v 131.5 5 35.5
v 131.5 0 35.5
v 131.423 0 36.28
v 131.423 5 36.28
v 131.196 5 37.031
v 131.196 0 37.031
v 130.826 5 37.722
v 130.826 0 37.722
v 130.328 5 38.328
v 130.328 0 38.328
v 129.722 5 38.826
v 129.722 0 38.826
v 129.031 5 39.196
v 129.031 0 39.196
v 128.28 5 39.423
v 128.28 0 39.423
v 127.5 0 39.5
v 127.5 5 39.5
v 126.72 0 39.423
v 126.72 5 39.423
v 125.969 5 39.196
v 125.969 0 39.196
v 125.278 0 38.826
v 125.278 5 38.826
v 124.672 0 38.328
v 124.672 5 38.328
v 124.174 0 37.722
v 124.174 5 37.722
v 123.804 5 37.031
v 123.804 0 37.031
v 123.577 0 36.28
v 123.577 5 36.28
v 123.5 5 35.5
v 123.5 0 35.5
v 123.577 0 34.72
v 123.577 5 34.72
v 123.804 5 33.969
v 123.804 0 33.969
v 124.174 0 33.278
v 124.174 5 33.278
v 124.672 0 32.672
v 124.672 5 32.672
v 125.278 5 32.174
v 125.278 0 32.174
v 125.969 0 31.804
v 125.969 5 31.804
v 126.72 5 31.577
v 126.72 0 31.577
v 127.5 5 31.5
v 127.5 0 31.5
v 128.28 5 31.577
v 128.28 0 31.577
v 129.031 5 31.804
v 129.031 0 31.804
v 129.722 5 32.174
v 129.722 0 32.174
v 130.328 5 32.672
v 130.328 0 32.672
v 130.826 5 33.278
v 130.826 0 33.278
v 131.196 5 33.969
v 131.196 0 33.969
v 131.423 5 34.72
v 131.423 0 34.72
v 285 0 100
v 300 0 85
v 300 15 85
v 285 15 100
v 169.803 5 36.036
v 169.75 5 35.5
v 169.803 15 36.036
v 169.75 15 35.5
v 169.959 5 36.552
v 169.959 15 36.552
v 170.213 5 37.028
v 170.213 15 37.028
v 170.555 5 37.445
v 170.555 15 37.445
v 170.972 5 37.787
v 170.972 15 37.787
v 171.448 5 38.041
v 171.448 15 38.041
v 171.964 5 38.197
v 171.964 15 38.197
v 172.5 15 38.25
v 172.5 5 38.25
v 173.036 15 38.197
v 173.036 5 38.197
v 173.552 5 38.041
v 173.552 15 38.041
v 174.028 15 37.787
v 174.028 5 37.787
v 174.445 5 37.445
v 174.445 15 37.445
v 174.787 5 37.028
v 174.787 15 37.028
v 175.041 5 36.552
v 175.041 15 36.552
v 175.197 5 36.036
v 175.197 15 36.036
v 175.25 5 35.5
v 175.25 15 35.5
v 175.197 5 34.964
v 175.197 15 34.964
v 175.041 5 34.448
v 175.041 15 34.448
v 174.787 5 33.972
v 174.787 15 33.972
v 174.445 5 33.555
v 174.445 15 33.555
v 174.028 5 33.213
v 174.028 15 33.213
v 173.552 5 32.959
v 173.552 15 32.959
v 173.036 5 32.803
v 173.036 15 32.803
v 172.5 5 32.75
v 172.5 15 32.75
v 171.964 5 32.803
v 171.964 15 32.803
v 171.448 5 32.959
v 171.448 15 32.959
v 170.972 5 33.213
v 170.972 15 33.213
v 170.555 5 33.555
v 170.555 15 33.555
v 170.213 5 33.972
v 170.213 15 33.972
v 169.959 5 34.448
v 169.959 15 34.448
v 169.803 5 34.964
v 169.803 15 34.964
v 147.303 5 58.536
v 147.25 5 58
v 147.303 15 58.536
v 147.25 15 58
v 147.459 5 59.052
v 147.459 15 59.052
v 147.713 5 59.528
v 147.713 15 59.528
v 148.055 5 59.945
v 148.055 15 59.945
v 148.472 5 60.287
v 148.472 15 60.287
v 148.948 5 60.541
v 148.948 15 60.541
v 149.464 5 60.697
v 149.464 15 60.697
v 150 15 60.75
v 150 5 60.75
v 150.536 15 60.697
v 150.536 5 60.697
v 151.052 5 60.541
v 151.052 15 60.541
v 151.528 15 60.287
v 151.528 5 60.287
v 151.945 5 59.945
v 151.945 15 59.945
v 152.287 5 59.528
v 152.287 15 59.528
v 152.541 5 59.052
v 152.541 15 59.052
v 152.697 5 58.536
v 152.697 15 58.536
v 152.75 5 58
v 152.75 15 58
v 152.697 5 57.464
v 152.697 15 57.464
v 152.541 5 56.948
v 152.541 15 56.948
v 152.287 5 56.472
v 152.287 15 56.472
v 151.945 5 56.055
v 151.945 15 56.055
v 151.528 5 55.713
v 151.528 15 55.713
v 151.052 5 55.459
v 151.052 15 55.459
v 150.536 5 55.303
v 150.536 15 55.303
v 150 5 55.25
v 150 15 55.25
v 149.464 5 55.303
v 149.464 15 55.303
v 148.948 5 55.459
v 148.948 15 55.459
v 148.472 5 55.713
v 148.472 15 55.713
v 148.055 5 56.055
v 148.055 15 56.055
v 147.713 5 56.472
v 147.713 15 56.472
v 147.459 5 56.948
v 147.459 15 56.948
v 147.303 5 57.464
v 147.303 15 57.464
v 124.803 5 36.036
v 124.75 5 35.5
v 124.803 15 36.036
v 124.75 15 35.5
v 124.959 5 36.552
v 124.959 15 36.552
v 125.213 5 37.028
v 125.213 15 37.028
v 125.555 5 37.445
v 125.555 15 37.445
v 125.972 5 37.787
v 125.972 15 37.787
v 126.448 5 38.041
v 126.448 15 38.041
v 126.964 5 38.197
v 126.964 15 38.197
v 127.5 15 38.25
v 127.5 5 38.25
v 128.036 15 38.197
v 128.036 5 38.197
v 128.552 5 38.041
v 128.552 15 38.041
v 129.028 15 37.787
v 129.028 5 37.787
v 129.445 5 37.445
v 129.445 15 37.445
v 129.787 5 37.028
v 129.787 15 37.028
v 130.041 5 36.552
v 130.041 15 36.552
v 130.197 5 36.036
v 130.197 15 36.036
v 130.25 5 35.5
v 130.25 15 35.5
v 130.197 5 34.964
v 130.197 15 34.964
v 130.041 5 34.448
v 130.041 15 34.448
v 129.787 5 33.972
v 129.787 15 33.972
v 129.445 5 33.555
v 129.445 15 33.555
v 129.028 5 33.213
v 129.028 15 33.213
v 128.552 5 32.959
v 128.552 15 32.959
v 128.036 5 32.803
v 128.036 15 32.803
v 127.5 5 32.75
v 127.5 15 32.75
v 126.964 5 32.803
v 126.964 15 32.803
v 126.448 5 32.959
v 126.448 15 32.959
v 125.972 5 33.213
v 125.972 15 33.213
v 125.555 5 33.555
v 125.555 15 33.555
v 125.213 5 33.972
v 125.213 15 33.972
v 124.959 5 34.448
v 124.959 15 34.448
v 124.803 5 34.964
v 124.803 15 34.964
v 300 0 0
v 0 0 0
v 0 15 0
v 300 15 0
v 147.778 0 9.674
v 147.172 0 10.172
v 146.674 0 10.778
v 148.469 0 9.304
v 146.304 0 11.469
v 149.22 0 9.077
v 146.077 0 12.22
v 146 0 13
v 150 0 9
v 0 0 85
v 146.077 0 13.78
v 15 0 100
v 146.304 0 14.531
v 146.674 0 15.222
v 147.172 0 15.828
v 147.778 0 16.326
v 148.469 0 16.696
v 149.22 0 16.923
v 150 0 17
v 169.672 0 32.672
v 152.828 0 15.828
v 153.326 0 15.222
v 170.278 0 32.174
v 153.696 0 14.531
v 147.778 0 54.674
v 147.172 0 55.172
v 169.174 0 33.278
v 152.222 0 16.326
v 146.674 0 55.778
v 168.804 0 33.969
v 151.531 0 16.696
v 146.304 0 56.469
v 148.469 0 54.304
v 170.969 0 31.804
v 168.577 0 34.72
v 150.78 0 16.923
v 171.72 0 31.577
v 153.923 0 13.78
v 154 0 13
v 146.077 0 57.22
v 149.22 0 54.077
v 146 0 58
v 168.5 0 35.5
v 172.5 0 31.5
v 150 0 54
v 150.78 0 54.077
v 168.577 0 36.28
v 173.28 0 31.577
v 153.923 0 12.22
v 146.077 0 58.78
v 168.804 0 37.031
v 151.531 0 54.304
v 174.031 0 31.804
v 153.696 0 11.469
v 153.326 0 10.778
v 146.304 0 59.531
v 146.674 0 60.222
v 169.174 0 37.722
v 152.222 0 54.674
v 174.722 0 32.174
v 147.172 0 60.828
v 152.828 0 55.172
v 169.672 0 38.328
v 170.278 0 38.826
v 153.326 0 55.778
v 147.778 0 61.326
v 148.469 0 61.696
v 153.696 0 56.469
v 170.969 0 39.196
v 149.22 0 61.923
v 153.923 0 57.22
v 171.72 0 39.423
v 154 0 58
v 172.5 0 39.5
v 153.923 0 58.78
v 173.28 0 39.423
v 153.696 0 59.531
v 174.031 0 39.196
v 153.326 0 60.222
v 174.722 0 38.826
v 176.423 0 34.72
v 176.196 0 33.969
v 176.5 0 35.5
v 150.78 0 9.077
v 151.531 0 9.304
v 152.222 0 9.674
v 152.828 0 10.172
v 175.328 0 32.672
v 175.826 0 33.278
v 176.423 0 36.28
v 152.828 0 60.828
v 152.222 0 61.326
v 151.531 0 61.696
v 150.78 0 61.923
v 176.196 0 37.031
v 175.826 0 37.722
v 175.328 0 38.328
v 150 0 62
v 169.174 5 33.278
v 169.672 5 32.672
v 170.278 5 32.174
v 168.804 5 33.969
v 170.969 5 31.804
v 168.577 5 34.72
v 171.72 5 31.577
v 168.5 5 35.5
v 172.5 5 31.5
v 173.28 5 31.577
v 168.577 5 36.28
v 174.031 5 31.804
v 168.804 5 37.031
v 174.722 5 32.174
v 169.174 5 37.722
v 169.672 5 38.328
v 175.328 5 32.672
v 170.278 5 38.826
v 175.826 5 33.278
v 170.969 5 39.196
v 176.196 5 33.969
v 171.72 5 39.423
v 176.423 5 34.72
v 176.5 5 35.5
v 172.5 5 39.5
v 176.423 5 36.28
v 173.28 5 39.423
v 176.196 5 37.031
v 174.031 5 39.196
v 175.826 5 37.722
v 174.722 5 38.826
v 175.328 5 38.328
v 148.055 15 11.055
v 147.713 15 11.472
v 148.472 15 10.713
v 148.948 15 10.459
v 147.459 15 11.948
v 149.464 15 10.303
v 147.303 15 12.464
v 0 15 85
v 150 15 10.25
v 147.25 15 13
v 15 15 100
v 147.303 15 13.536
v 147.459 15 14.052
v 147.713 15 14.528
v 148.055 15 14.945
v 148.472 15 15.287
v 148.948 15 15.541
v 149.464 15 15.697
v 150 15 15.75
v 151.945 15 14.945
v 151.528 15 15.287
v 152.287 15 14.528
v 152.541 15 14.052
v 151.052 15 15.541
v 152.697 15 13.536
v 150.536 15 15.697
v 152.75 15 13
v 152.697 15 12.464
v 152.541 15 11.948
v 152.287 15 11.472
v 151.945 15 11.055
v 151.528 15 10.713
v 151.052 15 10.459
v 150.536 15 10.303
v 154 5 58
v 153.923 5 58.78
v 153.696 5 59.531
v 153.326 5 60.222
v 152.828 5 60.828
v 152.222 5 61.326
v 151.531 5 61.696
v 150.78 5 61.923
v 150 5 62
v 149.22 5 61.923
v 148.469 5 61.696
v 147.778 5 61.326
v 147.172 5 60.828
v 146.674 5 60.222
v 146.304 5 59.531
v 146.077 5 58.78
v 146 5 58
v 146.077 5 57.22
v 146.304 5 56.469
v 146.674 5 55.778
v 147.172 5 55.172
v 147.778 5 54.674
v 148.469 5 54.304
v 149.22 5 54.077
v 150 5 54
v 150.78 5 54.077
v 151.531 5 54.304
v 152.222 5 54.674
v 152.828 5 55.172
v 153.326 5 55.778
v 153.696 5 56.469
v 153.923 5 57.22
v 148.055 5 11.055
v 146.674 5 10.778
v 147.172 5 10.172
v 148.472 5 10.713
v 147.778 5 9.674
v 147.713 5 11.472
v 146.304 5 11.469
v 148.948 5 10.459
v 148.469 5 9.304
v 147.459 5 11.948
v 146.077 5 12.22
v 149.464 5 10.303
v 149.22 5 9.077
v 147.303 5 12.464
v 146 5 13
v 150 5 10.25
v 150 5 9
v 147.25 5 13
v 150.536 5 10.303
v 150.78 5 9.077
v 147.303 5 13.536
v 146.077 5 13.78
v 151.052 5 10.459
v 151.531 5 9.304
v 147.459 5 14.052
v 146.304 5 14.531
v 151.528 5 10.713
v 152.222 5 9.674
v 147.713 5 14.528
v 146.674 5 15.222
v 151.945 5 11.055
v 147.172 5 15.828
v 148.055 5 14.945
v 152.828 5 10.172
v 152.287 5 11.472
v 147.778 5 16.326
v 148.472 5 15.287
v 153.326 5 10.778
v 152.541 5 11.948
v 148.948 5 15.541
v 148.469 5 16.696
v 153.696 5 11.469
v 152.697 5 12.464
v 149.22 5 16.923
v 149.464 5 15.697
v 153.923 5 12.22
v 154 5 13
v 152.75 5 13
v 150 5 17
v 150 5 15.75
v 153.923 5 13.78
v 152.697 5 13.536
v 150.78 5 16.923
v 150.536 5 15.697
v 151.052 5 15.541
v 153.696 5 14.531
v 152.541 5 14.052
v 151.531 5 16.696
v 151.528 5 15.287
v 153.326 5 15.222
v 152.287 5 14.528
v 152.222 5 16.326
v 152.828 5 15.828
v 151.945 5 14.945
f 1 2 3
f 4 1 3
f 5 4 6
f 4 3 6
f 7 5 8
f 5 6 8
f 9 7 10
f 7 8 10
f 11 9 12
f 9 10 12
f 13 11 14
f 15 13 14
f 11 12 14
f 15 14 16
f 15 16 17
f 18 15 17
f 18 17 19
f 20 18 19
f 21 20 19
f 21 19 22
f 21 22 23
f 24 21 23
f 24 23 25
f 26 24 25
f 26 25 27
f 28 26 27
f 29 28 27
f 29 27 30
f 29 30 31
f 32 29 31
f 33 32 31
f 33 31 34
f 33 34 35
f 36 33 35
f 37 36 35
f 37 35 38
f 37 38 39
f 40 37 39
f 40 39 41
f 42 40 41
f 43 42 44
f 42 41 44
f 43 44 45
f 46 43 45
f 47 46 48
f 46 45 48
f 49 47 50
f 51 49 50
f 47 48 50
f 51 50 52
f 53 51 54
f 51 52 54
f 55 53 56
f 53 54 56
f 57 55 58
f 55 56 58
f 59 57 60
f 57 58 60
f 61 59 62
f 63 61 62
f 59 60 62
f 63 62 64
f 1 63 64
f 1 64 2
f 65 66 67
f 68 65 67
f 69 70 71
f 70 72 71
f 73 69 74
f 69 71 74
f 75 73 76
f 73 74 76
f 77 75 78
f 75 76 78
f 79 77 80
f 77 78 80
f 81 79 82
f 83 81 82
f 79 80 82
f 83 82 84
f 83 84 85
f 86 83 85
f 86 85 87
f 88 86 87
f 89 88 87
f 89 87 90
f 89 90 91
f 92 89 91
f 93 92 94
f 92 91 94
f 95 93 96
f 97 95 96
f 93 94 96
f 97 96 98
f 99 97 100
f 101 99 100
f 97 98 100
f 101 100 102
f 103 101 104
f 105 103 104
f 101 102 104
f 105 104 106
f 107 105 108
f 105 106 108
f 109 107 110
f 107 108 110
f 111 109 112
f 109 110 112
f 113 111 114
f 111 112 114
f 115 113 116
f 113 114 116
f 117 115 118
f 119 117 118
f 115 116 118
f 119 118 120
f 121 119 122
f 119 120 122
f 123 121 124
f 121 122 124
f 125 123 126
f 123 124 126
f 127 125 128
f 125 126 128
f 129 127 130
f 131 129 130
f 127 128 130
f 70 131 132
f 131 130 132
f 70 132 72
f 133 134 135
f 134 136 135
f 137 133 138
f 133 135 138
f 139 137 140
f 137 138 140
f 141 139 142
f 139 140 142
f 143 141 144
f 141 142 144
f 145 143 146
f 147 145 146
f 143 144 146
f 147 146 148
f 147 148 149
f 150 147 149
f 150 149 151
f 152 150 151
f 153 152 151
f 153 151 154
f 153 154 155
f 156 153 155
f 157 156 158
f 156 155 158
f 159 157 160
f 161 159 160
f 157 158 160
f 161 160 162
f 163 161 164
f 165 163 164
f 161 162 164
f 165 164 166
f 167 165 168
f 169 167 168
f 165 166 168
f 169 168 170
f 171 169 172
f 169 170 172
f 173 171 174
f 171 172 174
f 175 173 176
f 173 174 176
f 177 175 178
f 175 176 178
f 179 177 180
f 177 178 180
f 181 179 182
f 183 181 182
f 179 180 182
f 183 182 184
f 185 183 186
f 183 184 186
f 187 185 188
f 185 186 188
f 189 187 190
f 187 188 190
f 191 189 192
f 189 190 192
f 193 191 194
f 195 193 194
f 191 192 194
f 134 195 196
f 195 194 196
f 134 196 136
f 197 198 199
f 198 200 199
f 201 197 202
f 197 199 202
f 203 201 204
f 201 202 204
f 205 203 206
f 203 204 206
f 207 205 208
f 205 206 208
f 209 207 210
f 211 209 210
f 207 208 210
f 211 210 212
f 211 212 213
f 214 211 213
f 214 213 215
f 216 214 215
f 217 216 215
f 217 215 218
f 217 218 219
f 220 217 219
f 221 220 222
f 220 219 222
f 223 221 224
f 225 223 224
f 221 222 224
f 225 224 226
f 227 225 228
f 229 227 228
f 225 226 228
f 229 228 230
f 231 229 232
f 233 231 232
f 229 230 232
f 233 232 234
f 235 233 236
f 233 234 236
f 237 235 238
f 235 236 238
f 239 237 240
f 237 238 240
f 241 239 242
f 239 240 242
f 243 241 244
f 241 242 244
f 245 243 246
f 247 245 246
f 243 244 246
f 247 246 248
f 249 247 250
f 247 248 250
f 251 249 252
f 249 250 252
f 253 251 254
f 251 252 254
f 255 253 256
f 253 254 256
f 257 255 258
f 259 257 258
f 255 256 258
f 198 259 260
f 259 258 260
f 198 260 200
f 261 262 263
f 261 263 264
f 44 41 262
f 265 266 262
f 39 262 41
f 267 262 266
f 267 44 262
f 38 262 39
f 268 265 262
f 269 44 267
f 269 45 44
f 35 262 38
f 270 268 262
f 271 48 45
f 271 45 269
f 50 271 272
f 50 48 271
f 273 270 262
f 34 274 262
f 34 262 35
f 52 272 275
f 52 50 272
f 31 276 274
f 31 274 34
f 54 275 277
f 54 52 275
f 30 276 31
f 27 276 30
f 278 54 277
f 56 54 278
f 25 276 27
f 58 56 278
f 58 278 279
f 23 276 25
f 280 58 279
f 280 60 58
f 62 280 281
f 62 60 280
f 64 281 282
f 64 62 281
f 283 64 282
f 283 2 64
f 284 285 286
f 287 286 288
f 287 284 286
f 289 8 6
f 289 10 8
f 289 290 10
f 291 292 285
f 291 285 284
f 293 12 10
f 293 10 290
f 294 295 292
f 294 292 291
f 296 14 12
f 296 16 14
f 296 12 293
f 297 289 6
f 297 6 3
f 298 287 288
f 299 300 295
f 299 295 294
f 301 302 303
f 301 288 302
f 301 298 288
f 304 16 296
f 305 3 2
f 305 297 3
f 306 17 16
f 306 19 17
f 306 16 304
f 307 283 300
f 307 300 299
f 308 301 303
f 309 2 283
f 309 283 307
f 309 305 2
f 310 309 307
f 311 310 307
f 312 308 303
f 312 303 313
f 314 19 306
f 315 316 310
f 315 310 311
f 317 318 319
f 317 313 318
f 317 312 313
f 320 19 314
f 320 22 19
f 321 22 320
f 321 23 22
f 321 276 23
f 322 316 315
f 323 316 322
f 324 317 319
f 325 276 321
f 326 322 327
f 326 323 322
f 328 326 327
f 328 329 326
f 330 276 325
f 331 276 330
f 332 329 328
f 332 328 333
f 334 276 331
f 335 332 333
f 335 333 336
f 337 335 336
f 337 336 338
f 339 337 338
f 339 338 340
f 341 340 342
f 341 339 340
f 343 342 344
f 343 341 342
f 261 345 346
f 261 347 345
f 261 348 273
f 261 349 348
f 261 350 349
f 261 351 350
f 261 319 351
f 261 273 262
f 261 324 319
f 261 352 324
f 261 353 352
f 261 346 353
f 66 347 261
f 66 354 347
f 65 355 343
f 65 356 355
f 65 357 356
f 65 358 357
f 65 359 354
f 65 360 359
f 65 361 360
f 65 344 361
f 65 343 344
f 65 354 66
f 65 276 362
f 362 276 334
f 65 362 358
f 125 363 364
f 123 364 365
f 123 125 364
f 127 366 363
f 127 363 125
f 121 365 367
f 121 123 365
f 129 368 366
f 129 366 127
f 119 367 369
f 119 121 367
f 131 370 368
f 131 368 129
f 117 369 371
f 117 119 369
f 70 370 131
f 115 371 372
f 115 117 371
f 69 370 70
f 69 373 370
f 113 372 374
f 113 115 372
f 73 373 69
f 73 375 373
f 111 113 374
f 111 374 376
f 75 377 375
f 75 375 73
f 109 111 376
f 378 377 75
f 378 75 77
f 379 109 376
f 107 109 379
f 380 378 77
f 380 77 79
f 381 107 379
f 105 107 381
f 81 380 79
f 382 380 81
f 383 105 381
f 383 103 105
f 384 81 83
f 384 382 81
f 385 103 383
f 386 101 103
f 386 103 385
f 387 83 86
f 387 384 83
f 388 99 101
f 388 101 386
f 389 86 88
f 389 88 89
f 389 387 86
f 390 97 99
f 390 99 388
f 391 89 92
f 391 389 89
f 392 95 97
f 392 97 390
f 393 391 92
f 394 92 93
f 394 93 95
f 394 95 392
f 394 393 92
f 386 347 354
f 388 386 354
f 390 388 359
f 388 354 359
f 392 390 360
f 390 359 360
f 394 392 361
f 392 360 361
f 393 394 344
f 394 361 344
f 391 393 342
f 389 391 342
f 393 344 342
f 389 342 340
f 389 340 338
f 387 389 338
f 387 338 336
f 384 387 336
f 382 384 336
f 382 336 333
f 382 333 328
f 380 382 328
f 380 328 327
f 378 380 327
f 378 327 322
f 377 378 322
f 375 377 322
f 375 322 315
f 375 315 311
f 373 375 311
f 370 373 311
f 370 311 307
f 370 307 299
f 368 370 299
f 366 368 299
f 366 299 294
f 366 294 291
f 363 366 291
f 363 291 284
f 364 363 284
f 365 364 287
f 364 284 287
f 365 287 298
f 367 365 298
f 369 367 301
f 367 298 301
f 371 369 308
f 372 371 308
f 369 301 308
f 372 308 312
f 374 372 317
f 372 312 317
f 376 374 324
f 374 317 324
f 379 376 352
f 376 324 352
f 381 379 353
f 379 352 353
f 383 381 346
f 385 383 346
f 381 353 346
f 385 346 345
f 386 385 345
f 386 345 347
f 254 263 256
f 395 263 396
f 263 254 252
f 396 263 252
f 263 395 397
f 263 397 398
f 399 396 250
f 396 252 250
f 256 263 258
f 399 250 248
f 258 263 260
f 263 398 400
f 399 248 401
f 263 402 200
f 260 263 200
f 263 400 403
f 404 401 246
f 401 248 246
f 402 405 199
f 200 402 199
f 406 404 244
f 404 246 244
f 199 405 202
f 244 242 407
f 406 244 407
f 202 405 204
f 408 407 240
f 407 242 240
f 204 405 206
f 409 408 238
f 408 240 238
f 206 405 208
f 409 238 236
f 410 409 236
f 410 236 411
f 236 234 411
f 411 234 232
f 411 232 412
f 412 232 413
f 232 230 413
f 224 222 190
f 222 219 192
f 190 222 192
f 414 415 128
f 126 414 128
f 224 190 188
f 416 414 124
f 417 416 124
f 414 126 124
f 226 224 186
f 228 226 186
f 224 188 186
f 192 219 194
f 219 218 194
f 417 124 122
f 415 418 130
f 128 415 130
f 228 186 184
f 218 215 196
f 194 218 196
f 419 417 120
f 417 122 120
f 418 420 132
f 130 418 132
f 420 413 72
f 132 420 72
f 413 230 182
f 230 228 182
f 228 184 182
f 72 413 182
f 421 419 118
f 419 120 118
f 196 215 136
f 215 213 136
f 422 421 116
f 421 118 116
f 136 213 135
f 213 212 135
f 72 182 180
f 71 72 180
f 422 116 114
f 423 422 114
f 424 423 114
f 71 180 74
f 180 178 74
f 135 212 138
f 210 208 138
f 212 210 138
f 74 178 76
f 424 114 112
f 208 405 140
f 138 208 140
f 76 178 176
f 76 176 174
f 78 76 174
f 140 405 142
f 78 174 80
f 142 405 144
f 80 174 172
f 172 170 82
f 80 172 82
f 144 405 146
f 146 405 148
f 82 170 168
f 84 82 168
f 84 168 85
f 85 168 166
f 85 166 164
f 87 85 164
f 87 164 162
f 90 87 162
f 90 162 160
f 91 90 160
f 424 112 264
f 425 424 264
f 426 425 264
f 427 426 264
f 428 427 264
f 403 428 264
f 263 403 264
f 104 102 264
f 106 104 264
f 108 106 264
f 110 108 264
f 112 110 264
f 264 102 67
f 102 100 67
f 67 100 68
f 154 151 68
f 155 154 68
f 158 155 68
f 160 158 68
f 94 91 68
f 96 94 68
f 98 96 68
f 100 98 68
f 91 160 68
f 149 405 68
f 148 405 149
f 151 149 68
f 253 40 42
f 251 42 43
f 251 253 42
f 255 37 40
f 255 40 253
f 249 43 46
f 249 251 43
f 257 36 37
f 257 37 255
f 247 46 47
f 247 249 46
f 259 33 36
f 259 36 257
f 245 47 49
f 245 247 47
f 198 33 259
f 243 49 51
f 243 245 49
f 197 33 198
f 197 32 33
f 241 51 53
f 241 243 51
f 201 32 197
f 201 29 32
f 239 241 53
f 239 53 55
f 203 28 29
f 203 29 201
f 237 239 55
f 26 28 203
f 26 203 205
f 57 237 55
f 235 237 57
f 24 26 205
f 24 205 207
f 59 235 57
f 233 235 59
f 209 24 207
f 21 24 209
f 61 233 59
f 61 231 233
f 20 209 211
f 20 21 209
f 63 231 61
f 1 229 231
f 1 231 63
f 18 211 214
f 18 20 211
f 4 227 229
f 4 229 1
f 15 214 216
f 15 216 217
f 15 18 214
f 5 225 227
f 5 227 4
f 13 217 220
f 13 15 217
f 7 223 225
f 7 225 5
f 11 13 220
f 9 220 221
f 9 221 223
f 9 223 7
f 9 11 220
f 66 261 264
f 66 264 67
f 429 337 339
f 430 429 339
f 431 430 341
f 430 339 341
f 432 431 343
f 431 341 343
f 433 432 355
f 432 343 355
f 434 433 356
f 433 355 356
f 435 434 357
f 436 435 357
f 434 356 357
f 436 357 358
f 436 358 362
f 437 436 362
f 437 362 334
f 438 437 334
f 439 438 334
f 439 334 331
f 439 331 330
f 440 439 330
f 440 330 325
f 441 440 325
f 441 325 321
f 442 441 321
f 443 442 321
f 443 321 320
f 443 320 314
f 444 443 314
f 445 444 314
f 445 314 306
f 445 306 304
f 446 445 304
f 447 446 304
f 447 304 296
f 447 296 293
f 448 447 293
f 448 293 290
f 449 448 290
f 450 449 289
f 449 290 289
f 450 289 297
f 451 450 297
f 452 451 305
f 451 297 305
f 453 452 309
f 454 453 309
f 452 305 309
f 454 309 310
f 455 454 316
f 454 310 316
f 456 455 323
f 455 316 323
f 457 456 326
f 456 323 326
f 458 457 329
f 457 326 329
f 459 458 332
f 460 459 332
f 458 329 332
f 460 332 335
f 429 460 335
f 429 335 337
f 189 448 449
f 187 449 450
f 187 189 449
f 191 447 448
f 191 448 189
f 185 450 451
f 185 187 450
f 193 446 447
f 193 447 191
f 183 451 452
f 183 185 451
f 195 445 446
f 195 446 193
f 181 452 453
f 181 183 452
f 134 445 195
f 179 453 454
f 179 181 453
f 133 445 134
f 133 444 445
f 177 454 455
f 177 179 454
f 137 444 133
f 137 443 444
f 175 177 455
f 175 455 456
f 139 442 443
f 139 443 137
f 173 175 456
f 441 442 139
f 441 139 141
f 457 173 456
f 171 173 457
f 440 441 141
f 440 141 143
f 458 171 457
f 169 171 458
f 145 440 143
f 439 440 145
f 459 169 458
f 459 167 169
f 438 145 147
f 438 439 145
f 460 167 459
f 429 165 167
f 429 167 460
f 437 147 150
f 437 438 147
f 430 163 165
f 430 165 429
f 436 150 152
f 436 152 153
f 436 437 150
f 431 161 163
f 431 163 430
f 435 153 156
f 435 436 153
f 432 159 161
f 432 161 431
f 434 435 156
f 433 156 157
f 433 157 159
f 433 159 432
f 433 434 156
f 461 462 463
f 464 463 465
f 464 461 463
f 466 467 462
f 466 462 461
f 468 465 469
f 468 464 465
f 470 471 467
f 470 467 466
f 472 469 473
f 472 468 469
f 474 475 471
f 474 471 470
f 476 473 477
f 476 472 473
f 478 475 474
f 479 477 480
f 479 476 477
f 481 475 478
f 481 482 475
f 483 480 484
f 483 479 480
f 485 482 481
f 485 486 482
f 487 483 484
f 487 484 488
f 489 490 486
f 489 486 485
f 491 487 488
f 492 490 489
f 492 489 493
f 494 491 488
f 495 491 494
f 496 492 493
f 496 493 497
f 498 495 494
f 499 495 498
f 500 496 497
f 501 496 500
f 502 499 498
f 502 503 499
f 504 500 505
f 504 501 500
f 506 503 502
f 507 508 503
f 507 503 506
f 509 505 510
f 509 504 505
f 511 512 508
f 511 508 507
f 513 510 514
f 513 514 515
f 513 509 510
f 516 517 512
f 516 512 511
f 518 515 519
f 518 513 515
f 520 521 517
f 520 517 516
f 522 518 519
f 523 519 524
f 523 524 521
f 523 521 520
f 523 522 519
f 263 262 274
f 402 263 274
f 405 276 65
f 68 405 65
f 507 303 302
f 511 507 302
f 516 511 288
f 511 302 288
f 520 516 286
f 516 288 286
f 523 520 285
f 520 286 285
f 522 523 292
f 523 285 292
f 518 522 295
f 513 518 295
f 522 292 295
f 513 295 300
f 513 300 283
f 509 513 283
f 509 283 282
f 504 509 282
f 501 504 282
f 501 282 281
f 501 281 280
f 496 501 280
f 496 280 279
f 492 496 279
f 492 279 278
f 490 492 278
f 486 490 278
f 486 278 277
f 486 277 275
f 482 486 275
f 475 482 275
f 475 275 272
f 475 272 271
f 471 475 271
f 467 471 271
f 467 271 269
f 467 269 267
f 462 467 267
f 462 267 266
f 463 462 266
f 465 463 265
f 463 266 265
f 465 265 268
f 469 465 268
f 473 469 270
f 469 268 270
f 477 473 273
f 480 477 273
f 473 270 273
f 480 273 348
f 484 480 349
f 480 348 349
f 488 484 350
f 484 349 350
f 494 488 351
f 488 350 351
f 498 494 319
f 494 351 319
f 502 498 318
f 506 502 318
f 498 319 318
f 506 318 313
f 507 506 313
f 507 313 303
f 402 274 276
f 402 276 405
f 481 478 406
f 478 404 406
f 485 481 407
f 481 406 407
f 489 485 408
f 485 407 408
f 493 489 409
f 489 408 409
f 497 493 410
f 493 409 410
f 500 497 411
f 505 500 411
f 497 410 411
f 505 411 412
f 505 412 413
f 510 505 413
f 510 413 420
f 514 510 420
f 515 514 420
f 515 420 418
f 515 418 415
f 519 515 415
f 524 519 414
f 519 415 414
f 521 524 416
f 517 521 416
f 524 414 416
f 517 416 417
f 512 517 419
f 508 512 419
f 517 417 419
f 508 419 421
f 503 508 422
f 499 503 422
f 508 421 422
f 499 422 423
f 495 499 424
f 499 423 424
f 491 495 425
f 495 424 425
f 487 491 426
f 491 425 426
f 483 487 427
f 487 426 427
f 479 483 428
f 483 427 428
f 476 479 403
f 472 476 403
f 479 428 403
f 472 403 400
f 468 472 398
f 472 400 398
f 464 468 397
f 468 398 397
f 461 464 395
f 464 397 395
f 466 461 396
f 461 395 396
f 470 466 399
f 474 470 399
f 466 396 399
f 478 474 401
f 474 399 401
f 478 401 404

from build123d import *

# Parameters (mm, degrees)
F0_W           = 300
F0_H           = 100
F1_DEPTH       = 15
F3_SIZE        = 15
F4_D           = 5.5
F4_CBORE_D     = 8
F4_CBORE_DEPTH = 5


with BuildPart() as f1:
    # F0 (on Front) → F1 (new body)
    with BuildSketch(Plane.XZ):
        with Locations((150, 50)):
            Rectangle(F0_W, F0_H)
    extrude(amount=-F1_DEPTH)

    # F3
    f3_edges = [f1.edges().sort_by_distance(p)[0] for p in [
        (0, 7.5, 100),
        (300, 7.5, 100),
    ]]
    chamfer(f3_edges, length=F3_SIZE)

    # F4 (through all)
    with Locations(Plane.XZ):
        with Locations((127.5, 35.5), (150, 58), (172.5, 35.5), (150, 13)):
            CounterBoreHole(F4_D / 2, F4_CBORE_D / 2, F4_CBORE_DEPTH)


solid = f1.part
